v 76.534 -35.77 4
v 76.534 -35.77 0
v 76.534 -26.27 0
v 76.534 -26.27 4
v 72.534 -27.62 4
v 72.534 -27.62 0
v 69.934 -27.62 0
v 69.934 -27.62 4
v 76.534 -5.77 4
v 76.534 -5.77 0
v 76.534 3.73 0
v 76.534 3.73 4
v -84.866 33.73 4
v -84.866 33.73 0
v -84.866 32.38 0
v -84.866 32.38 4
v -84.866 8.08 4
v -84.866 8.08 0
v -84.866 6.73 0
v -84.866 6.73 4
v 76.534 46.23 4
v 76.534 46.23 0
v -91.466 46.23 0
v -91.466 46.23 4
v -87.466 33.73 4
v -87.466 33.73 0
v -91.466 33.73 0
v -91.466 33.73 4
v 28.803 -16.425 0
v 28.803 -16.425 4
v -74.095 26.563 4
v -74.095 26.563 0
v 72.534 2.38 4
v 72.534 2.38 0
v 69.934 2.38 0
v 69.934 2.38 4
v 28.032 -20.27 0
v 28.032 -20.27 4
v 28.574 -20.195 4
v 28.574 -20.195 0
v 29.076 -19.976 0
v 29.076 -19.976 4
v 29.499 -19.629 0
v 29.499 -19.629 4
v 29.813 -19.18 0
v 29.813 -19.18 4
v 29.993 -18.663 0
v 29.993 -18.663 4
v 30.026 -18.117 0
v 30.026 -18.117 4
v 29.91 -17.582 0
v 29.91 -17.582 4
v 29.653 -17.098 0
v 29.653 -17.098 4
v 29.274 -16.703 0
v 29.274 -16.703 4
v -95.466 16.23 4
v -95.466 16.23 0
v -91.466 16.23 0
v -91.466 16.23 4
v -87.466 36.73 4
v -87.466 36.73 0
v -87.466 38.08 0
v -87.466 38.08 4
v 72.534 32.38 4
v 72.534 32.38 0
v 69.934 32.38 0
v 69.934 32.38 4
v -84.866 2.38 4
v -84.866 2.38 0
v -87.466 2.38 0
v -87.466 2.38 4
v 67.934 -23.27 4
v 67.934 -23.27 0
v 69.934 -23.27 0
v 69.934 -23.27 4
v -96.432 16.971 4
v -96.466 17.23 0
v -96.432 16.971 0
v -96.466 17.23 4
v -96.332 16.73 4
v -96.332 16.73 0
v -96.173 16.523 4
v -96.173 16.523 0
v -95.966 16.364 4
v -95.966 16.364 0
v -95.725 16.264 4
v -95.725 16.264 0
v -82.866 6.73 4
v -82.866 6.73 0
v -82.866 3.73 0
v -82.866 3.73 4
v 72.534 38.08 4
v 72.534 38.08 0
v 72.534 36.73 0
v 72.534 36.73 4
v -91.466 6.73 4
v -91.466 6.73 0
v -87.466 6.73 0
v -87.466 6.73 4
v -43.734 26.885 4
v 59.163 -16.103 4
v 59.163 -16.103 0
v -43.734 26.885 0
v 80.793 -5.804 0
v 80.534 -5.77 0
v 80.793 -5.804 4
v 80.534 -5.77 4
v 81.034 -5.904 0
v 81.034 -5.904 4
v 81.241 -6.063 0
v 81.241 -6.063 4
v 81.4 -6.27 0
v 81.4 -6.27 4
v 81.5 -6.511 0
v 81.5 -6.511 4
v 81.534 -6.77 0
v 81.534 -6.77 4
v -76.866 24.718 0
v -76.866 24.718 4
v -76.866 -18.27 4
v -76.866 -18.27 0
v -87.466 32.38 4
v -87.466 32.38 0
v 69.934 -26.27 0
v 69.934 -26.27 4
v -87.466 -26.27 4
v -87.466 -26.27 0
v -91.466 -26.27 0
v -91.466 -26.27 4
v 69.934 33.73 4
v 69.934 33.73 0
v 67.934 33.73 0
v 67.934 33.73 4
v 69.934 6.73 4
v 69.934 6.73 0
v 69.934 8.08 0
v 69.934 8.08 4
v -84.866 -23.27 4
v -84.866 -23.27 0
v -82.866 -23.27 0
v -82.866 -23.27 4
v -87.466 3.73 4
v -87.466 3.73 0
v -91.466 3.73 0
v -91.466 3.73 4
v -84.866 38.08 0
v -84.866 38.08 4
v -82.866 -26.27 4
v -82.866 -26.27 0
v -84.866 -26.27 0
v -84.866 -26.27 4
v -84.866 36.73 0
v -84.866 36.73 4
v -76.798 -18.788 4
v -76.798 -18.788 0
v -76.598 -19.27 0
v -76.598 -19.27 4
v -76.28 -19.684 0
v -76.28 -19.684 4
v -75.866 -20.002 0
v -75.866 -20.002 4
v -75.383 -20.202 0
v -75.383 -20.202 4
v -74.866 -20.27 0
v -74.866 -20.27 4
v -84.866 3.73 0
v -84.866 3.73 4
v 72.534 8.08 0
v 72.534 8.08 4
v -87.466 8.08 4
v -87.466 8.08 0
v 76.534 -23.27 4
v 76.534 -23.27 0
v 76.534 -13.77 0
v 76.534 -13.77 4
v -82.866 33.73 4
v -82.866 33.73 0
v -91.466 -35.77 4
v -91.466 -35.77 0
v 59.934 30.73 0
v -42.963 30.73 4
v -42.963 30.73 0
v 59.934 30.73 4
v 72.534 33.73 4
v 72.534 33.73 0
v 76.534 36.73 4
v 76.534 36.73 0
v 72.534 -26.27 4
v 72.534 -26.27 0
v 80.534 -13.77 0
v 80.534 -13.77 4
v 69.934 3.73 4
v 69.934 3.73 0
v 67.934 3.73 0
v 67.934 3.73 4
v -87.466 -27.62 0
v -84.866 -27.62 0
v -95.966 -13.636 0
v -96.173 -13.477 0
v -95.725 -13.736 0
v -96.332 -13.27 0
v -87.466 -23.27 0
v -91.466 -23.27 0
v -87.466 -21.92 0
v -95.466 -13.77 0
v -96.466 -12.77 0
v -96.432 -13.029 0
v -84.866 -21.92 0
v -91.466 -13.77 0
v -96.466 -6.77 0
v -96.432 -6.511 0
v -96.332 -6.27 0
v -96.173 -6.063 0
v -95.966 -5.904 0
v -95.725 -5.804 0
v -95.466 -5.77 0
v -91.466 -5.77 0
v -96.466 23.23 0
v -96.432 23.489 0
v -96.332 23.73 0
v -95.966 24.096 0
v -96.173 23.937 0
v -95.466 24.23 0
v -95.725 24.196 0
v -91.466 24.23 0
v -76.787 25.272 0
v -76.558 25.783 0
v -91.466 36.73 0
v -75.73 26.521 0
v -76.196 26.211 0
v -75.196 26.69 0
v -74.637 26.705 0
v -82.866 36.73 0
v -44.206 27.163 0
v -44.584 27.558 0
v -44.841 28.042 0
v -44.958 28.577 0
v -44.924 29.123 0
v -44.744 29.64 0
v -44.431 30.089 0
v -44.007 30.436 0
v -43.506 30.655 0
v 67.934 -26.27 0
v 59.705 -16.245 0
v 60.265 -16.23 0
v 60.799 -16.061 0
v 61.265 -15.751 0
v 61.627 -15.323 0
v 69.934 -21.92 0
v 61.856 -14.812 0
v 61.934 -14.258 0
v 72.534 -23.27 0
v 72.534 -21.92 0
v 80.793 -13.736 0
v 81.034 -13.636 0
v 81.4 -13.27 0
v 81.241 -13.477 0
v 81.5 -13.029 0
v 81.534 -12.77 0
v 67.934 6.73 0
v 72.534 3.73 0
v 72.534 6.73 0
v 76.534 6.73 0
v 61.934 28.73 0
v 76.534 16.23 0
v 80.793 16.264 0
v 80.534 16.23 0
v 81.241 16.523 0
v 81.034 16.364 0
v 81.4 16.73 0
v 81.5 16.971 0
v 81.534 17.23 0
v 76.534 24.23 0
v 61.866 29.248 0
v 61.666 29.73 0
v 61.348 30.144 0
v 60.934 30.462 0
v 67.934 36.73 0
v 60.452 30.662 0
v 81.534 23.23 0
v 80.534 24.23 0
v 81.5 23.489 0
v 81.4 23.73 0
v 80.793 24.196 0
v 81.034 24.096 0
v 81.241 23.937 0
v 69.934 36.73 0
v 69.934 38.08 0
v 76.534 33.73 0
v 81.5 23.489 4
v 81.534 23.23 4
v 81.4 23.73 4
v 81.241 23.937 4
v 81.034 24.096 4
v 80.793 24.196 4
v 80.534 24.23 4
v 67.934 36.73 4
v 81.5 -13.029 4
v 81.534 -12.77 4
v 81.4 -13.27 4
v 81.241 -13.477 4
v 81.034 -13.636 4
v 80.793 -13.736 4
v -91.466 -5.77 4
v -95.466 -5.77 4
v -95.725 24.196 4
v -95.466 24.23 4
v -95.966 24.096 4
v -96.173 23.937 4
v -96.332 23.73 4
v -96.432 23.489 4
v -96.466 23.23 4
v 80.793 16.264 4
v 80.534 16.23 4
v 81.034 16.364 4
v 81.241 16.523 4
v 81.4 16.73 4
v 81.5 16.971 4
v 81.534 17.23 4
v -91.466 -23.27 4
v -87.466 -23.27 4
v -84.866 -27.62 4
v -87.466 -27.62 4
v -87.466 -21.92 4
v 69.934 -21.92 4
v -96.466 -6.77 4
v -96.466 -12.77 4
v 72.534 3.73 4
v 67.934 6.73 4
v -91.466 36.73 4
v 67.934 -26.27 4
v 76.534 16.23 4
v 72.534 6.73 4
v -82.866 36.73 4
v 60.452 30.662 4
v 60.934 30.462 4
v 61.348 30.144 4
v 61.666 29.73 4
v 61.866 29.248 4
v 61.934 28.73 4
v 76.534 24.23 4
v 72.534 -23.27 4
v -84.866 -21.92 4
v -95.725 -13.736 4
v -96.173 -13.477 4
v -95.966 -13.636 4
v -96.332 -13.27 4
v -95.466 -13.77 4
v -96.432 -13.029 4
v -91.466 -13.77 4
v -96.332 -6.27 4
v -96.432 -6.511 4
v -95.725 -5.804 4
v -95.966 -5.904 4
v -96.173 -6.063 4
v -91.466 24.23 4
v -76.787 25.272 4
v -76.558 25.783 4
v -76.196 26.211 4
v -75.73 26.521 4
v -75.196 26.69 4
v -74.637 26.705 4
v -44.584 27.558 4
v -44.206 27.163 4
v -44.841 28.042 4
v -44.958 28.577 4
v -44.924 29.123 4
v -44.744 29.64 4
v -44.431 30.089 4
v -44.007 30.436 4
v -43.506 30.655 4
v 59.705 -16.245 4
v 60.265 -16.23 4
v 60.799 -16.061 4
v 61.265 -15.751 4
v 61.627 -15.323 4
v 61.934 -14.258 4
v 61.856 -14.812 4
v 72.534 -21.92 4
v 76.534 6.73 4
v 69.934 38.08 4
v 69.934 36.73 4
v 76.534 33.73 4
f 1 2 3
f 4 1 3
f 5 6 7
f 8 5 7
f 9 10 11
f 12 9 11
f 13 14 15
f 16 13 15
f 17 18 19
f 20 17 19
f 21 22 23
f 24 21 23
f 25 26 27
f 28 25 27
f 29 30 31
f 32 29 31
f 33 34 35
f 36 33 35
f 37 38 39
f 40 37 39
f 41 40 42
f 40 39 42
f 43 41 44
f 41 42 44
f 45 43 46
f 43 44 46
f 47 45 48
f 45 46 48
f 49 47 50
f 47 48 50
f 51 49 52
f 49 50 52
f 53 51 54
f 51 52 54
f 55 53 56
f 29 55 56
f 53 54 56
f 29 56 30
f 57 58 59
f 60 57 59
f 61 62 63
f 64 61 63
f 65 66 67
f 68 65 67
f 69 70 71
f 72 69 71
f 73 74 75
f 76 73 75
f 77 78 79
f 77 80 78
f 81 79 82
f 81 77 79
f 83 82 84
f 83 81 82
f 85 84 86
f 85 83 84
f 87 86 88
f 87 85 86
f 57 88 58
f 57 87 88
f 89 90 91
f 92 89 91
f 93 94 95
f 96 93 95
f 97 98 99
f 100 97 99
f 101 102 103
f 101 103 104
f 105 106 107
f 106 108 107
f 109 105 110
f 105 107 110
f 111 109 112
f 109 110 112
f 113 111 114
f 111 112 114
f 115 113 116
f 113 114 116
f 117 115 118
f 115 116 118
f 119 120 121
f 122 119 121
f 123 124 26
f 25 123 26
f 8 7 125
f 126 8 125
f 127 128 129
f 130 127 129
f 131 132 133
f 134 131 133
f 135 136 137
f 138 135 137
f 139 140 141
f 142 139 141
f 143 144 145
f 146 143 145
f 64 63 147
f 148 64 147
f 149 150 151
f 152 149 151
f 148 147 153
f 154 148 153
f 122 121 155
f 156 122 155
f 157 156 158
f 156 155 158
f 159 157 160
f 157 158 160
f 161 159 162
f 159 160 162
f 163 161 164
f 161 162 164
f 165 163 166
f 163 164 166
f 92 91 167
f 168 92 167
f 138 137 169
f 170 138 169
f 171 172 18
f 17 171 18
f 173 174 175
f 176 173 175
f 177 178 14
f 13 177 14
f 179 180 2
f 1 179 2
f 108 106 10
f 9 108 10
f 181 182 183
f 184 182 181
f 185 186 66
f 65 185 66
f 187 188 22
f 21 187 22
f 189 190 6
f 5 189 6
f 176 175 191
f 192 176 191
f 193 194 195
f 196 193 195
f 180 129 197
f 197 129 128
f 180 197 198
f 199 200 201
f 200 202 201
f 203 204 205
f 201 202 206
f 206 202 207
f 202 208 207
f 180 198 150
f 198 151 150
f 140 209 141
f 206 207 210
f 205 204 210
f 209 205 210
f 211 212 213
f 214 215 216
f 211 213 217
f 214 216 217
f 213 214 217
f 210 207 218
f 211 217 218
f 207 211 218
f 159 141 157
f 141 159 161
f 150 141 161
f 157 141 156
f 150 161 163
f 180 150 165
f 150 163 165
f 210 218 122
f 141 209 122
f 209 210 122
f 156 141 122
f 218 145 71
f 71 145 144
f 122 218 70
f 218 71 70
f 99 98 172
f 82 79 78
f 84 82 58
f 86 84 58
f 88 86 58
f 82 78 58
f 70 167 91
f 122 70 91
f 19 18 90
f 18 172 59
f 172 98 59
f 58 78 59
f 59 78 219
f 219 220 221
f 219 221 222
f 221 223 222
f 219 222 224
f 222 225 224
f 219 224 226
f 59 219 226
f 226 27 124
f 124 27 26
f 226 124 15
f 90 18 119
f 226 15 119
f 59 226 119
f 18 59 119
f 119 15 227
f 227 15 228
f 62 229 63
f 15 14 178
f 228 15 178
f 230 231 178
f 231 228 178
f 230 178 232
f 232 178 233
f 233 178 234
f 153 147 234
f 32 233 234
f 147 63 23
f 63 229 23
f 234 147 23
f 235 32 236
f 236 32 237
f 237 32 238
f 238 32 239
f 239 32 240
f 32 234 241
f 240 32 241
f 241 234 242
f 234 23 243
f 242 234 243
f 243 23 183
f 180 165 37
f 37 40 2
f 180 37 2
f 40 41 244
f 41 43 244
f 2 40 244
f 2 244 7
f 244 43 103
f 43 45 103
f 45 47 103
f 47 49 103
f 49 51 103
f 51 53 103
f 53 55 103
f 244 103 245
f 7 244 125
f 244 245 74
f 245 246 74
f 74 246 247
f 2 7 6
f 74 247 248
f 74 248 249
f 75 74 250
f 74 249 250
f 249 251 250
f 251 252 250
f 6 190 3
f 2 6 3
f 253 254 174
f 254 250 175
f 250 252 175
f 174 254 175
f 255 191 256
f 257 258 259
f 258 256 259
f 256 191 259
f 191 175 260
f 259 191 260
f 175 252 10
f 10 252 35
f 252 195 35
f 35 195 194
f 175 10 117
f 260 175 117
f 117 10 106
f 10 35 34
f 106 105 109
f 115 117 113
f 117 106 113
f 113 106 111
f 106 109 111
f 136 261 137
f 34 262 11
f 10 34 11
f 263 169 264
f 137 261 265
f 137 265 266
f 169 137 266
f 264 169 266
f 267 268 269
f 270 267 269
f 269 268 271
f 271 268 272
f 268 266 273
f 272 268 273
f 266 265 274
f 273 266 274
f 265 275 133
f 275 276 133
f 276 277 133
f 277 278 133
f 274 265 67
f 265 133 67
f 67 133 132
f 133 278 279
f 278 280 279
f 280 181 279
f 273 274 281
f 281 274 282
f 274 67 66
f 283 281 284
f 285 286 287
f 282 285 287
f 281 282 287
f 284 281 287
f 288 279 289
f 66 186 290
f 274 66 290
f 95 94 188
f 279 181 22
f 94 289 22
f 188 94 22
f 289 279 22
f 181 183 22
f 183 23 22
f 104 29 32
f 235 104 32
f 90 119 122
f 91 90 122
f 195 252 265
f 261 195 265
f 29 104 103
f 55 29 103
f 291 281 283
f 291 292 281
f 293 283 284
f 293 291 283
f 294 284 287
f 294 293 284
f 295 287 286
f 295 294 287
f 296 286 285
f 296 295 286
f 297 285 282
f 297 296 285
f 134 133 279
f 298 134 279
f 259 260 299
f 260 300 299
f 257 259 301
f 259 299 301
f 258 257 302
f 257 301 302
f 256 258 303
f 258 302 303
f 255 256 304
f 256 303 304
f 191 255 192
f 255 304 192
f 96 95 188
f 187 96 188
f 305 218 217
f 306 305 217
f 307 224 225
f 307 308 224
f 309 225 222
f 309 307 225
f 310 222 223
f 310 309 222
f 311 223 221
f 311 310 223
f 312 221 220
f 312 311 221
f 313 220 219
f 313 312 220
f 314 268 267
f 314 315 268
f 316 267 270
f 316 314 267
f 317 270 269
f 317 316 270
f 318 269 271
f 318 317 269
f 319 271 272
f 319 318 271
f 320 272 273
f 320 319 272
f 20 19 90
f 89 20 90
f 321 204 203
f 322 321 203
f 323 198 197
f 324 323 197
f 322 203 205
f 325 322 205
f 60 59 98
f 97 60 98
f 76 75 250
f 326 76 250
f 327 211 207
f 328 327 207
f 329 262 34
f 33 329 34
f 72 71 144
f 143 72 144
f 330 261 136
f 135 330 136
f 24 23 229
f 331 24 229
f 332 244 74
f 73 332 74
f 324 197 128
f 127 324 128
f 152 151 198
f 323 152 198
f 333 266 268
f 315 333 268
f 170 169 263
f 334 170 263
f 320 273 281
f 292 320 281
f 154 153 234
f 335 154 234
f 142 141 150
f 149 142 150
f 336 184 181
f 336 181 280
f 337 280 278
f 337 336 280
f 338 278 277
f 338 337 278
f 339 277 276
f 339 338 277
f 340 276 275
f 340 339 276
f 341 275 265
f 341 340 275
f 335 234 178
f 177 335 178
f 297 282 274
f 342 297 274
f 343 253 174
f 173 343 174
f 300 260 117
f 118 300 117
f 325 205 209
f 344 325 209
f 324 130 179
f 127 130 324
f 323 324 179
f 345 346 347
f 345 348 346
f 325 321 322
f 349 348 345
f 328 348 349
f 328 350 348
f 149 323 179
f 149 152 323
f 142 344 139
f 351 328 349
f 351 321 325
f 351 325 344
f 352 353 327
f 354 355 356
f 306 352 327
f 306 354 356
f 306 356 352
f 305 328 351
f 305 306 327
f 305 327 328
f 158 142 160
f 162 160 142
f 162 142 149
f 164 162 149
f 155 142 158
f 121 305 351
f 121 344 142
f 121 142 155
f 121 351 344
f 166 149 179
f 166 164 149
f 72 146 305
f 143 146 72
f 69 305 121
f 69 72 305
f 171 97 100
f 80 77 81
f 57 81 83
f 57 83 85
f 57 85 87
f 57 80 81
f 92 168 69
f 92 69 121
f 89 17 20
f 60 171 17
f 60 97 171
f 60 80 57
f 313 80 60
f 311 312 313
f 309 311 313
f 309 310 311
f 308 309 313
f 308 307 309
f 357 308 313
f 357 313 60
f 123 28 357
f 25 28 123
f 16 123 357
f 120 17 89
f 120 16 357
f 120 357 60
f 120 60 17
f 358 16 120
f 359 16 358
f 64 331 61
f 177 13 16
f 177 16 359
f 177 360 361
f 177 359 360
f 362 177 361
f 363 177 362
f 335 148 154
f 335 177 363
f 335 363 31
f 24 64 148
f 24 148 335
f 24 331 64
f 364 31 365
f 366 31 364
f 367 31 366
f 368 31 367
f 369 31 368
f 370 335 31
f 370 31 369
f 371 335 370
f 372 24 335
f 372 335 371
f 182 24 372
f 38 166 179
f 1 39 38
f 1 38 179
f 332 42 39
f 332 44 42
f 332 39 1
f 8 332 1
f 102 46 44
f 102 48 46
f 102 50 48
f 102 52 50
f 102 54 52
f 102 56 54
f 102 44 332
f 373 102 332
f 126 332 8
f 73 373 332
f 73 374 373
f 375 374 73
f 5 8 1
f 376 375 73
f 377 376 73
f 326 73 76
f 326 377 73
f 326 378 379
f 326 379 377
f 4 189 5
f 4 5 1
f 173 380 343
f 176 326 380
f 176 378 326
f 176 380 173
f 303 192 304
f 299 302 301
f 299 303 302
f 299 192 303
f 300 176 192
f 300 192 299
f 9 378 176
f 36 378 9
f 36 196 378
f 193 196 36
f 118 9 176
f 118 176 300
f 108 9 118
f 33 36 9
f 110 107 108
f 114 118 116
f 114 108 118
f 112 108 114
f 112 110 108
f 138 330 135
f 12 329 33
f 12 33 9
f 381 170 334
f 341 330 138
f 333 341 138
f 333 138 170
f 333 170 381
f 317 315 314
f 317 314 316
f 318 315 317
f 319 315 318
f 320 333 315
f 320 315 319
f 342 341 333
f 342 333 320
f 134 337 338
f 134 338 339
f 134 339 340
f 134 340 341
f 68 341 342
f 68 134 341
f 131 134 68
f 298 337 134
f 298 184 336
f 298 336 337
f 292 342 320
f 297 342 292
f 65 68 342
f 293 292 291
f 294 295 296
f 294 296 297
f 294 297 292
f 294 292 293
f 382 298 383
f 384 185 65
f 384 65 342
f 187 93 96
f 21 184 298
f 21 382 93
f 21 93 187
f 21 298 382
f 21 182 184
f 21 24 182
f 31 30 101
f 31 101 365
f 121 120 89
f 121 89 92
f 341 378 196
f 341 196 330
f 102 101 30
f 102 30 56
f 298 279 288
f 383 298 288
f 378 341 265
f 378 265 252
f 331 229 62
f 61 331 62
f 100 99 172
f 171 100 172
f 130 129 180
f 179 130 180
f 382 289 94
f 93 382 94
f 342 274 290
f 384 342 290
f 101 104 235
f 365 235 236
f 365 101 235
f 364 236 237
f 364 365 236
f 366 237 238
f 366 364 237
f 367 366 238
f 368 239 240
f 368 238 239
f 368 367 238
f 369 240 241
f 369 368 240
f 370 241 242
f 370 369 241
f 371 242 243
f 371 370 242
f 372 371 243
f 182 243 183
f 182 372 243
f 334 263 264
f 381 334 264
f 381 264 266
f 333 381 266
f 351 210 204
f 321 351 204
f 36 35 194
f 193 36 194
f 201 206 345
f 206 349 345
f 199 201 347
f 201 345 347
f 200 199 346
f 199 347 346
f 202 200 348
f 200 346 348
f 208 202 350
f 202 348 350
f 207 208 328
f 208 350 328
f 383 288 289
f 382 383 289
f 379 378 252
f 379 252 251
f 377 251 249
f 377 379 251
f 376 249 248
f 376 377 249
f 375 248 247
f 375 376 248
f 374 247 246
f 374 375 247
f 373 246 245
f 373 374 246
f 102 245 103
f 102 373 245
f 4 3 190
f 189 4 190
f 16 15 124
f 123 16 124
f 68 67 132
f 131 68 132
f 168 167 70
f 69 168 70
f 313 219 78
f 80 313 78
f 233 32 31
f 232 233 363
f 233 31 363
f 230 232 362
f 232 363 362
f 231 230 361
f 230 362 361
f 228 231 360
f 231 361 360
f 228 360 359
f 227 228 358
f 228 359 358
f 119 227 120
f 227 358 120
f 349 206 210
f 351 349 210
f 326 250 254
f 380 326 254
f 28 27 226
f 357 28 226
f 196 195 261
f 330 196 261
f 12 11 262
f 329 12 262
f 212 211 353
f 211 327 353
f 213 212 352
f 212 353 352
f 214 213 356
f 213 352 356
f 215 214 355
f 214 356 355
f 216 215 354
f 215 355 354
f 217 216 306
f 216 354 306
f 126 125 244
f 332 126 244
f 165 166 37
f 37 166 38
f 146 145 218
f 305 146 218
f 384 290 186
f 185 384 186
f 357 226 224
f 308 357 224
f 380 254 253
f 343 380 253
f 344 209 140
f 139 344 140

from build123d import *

# Parameters (mm, degrees)
EXTRUDE_1_DEPTH     = 4
CUT_EXTRUDE_1_DEPTH = 10
FILLET_1_R          = 1


with BuildPart() as part:
    # 草图1 → 凸台-拉伸1 (new body)
    with BuildSketch(Plane.XY):
        Polygon((72.534285714, 6.73), (76.534285714, 6.73), (76.534285714, 16.23), (81.534285714, 16.23), (81.534285714, 24.23), (76.534285714, 24.23), (76.534285714, 33.73), (72.534285714, 33.73), (72.534285714, 32.38), (69.934285714, 32.38), (69.934285714, 33.73), (67.934285714, 33.73), (67.934285714, 36.73), (69.934285714, 36.73), (69.934285714, 38.08), (72.534285714, 38.08), (72.534285714, 36.73), (76.534285714, 36.73), (76.534285714, 46.23), (54.534285714, 46.23), (-91.465714286, 46.23), (-91.465714286, 36.73), (-87.465714286, 36.73), (-87.465714286, 38.08), (-84.865714286, 38.08), (-84.865714286, 36.73), (-82.865714286, 36.73), (-82.865714286, 33.73), (-84.865714286, 33.73), (-84.865714286, 32.38), (-87.465714286, 32.38), (-87.465714286, 33.73), (-91.465714286, 33.73), (-91.465714286, 24.23), (-96.465714286, 24.23), (-96.465714286, 16.23), (-91.465714286, 16.23), (-91.465714286, 6.73), (-87.465714286, 6.73), (-87.465714286, 8.08), (-84.865714286, 8.08), (-84.865714286, 6.73), (-82.865714286, 6.73), (-82.865714286, 3.73), (-84.865714286, 3.73), (-84.865714286, 2.38), (-87.465714286, 2.38), (-87.465714286, 3.73), (-91.465714286, 3.73), (-91.465714286, -5.77), (-96.465714286, -5.77), (-96.465714286, -13.77), (-91.465714286, -13.77), (-91.465714286, -23.27), (-87.465714286, -23.27), (-87.465714286, -21.92), (-84.865714286, -21.92), (-84.865714286, -23.27), (-82.865714286, -23.27), (-82.865714286, -26.27), (-84.865714286, -26.27), (-84.865714286, -27.62), (-87.465714286, -27.62), (-87.465714286, -26.27), (-91.465714286, -26.27), (-91.465714286, -35.77), (54.534285714, -35.77), (76.534285714, -35.77), (76.534285714, -26.27), (72.534285714, -26.27), (72.534285714, -27.62), (69.934285714, -27.62), (69.934285714, -26.27), (67.934285714, -26.27), (67.934285714, -23.27), (69.934285714, -23.27), (69.934285714, -21.92), (72.534285714, -21.92), (72.534285714, -23.27), (76.534285714, -23.27), (76.534285714, -13.77), (81.534285714, -13.77), (81.534285714, -5.77), (76.534285714, -5.77), (76.534285714, 3.73), (72.534285714, 3.73), (72.534285714, 2.38), (69.934285714, 2.38), (69.934285714, 3.73), (67.934285714, 3.73), (67.934285714, 6.73), (69.934285714, 6.73), (69.934285714, 8.08), (72.534285714, 8.08), align=None)
    extrude(amount=EXTRUDE_1_DEPTH)

    # 草图3 → 切除-拉伸1 (cut)
    with BuildSketch(Plane.XY.offset(4)):
        with BuildLine():
            Line((28.802924928, -16.42457109), (-74.094745974, 26.563182669))
            ThreePointArc((-74.094745974, 26.563182669), (-75.974331302, 26.382376332), (-76.865714286, 24.717753759))
            Line((-76.865714286, 24.717753759), (-76.865714286, -18.27))
            ThreePointArc((-76.865714286, -18.27), (-76.279927848, -19.684213562), (-74.865714286, -20.27))
            Line((-74.865714286, -20.27), (28.031956617, -20.27))
            ThreePointArc((28.031956617, -20.27), (29.992933136, -18.6631553), (28.802924928, -16.42457109))
        make_face()
        with BuildLine():
            Line((-42.963385188, 30.73), (59.934285714, 30.73))
            ThreePointArc((59.934285714, 30.73), (61.348499277, 30.144213562), (61.934285714, 28.73))
            Line((61.934285714, 28.73), (61.934285714, -14.257753759))
            ThreePointArc((61.934285714, -14.257753759), (61.042902731, -15.922376332), (59.163317403, -16.103182669))
            Line((59.163317403, -16.103182669), (-43.7343535, 26.88457109))
            ThreePointArc((-43.7343535, 26.88457109), (-44.924361708, 29.1231553), (-42.963385188, 30.73))
        make_face()
    extrude(amount=-CUT_EXTRUDE_1_DEPTH, mode=Mode.SUBTRACT)

    # 圆角1
    fillet_1_edges = [part.edges().sort_by_distance(p)[0] for p in [
        (-96.465714286, -13.77, 2),
        (-96.465714286, -5.77, 2),
        (-96.465714286, 16.23, 2),
        (-96.465714286, 24.23, 2),
        (81.534285714, 24.23, 2),
        (81.534285714, 16.23, 2),
        (81.534285714, -5.77, 2),
        (81.534285714, -13.77, 2),
    ]]
    fillet(fillet_1_edges, radius=FILLET_1_R)


solid = part.part
